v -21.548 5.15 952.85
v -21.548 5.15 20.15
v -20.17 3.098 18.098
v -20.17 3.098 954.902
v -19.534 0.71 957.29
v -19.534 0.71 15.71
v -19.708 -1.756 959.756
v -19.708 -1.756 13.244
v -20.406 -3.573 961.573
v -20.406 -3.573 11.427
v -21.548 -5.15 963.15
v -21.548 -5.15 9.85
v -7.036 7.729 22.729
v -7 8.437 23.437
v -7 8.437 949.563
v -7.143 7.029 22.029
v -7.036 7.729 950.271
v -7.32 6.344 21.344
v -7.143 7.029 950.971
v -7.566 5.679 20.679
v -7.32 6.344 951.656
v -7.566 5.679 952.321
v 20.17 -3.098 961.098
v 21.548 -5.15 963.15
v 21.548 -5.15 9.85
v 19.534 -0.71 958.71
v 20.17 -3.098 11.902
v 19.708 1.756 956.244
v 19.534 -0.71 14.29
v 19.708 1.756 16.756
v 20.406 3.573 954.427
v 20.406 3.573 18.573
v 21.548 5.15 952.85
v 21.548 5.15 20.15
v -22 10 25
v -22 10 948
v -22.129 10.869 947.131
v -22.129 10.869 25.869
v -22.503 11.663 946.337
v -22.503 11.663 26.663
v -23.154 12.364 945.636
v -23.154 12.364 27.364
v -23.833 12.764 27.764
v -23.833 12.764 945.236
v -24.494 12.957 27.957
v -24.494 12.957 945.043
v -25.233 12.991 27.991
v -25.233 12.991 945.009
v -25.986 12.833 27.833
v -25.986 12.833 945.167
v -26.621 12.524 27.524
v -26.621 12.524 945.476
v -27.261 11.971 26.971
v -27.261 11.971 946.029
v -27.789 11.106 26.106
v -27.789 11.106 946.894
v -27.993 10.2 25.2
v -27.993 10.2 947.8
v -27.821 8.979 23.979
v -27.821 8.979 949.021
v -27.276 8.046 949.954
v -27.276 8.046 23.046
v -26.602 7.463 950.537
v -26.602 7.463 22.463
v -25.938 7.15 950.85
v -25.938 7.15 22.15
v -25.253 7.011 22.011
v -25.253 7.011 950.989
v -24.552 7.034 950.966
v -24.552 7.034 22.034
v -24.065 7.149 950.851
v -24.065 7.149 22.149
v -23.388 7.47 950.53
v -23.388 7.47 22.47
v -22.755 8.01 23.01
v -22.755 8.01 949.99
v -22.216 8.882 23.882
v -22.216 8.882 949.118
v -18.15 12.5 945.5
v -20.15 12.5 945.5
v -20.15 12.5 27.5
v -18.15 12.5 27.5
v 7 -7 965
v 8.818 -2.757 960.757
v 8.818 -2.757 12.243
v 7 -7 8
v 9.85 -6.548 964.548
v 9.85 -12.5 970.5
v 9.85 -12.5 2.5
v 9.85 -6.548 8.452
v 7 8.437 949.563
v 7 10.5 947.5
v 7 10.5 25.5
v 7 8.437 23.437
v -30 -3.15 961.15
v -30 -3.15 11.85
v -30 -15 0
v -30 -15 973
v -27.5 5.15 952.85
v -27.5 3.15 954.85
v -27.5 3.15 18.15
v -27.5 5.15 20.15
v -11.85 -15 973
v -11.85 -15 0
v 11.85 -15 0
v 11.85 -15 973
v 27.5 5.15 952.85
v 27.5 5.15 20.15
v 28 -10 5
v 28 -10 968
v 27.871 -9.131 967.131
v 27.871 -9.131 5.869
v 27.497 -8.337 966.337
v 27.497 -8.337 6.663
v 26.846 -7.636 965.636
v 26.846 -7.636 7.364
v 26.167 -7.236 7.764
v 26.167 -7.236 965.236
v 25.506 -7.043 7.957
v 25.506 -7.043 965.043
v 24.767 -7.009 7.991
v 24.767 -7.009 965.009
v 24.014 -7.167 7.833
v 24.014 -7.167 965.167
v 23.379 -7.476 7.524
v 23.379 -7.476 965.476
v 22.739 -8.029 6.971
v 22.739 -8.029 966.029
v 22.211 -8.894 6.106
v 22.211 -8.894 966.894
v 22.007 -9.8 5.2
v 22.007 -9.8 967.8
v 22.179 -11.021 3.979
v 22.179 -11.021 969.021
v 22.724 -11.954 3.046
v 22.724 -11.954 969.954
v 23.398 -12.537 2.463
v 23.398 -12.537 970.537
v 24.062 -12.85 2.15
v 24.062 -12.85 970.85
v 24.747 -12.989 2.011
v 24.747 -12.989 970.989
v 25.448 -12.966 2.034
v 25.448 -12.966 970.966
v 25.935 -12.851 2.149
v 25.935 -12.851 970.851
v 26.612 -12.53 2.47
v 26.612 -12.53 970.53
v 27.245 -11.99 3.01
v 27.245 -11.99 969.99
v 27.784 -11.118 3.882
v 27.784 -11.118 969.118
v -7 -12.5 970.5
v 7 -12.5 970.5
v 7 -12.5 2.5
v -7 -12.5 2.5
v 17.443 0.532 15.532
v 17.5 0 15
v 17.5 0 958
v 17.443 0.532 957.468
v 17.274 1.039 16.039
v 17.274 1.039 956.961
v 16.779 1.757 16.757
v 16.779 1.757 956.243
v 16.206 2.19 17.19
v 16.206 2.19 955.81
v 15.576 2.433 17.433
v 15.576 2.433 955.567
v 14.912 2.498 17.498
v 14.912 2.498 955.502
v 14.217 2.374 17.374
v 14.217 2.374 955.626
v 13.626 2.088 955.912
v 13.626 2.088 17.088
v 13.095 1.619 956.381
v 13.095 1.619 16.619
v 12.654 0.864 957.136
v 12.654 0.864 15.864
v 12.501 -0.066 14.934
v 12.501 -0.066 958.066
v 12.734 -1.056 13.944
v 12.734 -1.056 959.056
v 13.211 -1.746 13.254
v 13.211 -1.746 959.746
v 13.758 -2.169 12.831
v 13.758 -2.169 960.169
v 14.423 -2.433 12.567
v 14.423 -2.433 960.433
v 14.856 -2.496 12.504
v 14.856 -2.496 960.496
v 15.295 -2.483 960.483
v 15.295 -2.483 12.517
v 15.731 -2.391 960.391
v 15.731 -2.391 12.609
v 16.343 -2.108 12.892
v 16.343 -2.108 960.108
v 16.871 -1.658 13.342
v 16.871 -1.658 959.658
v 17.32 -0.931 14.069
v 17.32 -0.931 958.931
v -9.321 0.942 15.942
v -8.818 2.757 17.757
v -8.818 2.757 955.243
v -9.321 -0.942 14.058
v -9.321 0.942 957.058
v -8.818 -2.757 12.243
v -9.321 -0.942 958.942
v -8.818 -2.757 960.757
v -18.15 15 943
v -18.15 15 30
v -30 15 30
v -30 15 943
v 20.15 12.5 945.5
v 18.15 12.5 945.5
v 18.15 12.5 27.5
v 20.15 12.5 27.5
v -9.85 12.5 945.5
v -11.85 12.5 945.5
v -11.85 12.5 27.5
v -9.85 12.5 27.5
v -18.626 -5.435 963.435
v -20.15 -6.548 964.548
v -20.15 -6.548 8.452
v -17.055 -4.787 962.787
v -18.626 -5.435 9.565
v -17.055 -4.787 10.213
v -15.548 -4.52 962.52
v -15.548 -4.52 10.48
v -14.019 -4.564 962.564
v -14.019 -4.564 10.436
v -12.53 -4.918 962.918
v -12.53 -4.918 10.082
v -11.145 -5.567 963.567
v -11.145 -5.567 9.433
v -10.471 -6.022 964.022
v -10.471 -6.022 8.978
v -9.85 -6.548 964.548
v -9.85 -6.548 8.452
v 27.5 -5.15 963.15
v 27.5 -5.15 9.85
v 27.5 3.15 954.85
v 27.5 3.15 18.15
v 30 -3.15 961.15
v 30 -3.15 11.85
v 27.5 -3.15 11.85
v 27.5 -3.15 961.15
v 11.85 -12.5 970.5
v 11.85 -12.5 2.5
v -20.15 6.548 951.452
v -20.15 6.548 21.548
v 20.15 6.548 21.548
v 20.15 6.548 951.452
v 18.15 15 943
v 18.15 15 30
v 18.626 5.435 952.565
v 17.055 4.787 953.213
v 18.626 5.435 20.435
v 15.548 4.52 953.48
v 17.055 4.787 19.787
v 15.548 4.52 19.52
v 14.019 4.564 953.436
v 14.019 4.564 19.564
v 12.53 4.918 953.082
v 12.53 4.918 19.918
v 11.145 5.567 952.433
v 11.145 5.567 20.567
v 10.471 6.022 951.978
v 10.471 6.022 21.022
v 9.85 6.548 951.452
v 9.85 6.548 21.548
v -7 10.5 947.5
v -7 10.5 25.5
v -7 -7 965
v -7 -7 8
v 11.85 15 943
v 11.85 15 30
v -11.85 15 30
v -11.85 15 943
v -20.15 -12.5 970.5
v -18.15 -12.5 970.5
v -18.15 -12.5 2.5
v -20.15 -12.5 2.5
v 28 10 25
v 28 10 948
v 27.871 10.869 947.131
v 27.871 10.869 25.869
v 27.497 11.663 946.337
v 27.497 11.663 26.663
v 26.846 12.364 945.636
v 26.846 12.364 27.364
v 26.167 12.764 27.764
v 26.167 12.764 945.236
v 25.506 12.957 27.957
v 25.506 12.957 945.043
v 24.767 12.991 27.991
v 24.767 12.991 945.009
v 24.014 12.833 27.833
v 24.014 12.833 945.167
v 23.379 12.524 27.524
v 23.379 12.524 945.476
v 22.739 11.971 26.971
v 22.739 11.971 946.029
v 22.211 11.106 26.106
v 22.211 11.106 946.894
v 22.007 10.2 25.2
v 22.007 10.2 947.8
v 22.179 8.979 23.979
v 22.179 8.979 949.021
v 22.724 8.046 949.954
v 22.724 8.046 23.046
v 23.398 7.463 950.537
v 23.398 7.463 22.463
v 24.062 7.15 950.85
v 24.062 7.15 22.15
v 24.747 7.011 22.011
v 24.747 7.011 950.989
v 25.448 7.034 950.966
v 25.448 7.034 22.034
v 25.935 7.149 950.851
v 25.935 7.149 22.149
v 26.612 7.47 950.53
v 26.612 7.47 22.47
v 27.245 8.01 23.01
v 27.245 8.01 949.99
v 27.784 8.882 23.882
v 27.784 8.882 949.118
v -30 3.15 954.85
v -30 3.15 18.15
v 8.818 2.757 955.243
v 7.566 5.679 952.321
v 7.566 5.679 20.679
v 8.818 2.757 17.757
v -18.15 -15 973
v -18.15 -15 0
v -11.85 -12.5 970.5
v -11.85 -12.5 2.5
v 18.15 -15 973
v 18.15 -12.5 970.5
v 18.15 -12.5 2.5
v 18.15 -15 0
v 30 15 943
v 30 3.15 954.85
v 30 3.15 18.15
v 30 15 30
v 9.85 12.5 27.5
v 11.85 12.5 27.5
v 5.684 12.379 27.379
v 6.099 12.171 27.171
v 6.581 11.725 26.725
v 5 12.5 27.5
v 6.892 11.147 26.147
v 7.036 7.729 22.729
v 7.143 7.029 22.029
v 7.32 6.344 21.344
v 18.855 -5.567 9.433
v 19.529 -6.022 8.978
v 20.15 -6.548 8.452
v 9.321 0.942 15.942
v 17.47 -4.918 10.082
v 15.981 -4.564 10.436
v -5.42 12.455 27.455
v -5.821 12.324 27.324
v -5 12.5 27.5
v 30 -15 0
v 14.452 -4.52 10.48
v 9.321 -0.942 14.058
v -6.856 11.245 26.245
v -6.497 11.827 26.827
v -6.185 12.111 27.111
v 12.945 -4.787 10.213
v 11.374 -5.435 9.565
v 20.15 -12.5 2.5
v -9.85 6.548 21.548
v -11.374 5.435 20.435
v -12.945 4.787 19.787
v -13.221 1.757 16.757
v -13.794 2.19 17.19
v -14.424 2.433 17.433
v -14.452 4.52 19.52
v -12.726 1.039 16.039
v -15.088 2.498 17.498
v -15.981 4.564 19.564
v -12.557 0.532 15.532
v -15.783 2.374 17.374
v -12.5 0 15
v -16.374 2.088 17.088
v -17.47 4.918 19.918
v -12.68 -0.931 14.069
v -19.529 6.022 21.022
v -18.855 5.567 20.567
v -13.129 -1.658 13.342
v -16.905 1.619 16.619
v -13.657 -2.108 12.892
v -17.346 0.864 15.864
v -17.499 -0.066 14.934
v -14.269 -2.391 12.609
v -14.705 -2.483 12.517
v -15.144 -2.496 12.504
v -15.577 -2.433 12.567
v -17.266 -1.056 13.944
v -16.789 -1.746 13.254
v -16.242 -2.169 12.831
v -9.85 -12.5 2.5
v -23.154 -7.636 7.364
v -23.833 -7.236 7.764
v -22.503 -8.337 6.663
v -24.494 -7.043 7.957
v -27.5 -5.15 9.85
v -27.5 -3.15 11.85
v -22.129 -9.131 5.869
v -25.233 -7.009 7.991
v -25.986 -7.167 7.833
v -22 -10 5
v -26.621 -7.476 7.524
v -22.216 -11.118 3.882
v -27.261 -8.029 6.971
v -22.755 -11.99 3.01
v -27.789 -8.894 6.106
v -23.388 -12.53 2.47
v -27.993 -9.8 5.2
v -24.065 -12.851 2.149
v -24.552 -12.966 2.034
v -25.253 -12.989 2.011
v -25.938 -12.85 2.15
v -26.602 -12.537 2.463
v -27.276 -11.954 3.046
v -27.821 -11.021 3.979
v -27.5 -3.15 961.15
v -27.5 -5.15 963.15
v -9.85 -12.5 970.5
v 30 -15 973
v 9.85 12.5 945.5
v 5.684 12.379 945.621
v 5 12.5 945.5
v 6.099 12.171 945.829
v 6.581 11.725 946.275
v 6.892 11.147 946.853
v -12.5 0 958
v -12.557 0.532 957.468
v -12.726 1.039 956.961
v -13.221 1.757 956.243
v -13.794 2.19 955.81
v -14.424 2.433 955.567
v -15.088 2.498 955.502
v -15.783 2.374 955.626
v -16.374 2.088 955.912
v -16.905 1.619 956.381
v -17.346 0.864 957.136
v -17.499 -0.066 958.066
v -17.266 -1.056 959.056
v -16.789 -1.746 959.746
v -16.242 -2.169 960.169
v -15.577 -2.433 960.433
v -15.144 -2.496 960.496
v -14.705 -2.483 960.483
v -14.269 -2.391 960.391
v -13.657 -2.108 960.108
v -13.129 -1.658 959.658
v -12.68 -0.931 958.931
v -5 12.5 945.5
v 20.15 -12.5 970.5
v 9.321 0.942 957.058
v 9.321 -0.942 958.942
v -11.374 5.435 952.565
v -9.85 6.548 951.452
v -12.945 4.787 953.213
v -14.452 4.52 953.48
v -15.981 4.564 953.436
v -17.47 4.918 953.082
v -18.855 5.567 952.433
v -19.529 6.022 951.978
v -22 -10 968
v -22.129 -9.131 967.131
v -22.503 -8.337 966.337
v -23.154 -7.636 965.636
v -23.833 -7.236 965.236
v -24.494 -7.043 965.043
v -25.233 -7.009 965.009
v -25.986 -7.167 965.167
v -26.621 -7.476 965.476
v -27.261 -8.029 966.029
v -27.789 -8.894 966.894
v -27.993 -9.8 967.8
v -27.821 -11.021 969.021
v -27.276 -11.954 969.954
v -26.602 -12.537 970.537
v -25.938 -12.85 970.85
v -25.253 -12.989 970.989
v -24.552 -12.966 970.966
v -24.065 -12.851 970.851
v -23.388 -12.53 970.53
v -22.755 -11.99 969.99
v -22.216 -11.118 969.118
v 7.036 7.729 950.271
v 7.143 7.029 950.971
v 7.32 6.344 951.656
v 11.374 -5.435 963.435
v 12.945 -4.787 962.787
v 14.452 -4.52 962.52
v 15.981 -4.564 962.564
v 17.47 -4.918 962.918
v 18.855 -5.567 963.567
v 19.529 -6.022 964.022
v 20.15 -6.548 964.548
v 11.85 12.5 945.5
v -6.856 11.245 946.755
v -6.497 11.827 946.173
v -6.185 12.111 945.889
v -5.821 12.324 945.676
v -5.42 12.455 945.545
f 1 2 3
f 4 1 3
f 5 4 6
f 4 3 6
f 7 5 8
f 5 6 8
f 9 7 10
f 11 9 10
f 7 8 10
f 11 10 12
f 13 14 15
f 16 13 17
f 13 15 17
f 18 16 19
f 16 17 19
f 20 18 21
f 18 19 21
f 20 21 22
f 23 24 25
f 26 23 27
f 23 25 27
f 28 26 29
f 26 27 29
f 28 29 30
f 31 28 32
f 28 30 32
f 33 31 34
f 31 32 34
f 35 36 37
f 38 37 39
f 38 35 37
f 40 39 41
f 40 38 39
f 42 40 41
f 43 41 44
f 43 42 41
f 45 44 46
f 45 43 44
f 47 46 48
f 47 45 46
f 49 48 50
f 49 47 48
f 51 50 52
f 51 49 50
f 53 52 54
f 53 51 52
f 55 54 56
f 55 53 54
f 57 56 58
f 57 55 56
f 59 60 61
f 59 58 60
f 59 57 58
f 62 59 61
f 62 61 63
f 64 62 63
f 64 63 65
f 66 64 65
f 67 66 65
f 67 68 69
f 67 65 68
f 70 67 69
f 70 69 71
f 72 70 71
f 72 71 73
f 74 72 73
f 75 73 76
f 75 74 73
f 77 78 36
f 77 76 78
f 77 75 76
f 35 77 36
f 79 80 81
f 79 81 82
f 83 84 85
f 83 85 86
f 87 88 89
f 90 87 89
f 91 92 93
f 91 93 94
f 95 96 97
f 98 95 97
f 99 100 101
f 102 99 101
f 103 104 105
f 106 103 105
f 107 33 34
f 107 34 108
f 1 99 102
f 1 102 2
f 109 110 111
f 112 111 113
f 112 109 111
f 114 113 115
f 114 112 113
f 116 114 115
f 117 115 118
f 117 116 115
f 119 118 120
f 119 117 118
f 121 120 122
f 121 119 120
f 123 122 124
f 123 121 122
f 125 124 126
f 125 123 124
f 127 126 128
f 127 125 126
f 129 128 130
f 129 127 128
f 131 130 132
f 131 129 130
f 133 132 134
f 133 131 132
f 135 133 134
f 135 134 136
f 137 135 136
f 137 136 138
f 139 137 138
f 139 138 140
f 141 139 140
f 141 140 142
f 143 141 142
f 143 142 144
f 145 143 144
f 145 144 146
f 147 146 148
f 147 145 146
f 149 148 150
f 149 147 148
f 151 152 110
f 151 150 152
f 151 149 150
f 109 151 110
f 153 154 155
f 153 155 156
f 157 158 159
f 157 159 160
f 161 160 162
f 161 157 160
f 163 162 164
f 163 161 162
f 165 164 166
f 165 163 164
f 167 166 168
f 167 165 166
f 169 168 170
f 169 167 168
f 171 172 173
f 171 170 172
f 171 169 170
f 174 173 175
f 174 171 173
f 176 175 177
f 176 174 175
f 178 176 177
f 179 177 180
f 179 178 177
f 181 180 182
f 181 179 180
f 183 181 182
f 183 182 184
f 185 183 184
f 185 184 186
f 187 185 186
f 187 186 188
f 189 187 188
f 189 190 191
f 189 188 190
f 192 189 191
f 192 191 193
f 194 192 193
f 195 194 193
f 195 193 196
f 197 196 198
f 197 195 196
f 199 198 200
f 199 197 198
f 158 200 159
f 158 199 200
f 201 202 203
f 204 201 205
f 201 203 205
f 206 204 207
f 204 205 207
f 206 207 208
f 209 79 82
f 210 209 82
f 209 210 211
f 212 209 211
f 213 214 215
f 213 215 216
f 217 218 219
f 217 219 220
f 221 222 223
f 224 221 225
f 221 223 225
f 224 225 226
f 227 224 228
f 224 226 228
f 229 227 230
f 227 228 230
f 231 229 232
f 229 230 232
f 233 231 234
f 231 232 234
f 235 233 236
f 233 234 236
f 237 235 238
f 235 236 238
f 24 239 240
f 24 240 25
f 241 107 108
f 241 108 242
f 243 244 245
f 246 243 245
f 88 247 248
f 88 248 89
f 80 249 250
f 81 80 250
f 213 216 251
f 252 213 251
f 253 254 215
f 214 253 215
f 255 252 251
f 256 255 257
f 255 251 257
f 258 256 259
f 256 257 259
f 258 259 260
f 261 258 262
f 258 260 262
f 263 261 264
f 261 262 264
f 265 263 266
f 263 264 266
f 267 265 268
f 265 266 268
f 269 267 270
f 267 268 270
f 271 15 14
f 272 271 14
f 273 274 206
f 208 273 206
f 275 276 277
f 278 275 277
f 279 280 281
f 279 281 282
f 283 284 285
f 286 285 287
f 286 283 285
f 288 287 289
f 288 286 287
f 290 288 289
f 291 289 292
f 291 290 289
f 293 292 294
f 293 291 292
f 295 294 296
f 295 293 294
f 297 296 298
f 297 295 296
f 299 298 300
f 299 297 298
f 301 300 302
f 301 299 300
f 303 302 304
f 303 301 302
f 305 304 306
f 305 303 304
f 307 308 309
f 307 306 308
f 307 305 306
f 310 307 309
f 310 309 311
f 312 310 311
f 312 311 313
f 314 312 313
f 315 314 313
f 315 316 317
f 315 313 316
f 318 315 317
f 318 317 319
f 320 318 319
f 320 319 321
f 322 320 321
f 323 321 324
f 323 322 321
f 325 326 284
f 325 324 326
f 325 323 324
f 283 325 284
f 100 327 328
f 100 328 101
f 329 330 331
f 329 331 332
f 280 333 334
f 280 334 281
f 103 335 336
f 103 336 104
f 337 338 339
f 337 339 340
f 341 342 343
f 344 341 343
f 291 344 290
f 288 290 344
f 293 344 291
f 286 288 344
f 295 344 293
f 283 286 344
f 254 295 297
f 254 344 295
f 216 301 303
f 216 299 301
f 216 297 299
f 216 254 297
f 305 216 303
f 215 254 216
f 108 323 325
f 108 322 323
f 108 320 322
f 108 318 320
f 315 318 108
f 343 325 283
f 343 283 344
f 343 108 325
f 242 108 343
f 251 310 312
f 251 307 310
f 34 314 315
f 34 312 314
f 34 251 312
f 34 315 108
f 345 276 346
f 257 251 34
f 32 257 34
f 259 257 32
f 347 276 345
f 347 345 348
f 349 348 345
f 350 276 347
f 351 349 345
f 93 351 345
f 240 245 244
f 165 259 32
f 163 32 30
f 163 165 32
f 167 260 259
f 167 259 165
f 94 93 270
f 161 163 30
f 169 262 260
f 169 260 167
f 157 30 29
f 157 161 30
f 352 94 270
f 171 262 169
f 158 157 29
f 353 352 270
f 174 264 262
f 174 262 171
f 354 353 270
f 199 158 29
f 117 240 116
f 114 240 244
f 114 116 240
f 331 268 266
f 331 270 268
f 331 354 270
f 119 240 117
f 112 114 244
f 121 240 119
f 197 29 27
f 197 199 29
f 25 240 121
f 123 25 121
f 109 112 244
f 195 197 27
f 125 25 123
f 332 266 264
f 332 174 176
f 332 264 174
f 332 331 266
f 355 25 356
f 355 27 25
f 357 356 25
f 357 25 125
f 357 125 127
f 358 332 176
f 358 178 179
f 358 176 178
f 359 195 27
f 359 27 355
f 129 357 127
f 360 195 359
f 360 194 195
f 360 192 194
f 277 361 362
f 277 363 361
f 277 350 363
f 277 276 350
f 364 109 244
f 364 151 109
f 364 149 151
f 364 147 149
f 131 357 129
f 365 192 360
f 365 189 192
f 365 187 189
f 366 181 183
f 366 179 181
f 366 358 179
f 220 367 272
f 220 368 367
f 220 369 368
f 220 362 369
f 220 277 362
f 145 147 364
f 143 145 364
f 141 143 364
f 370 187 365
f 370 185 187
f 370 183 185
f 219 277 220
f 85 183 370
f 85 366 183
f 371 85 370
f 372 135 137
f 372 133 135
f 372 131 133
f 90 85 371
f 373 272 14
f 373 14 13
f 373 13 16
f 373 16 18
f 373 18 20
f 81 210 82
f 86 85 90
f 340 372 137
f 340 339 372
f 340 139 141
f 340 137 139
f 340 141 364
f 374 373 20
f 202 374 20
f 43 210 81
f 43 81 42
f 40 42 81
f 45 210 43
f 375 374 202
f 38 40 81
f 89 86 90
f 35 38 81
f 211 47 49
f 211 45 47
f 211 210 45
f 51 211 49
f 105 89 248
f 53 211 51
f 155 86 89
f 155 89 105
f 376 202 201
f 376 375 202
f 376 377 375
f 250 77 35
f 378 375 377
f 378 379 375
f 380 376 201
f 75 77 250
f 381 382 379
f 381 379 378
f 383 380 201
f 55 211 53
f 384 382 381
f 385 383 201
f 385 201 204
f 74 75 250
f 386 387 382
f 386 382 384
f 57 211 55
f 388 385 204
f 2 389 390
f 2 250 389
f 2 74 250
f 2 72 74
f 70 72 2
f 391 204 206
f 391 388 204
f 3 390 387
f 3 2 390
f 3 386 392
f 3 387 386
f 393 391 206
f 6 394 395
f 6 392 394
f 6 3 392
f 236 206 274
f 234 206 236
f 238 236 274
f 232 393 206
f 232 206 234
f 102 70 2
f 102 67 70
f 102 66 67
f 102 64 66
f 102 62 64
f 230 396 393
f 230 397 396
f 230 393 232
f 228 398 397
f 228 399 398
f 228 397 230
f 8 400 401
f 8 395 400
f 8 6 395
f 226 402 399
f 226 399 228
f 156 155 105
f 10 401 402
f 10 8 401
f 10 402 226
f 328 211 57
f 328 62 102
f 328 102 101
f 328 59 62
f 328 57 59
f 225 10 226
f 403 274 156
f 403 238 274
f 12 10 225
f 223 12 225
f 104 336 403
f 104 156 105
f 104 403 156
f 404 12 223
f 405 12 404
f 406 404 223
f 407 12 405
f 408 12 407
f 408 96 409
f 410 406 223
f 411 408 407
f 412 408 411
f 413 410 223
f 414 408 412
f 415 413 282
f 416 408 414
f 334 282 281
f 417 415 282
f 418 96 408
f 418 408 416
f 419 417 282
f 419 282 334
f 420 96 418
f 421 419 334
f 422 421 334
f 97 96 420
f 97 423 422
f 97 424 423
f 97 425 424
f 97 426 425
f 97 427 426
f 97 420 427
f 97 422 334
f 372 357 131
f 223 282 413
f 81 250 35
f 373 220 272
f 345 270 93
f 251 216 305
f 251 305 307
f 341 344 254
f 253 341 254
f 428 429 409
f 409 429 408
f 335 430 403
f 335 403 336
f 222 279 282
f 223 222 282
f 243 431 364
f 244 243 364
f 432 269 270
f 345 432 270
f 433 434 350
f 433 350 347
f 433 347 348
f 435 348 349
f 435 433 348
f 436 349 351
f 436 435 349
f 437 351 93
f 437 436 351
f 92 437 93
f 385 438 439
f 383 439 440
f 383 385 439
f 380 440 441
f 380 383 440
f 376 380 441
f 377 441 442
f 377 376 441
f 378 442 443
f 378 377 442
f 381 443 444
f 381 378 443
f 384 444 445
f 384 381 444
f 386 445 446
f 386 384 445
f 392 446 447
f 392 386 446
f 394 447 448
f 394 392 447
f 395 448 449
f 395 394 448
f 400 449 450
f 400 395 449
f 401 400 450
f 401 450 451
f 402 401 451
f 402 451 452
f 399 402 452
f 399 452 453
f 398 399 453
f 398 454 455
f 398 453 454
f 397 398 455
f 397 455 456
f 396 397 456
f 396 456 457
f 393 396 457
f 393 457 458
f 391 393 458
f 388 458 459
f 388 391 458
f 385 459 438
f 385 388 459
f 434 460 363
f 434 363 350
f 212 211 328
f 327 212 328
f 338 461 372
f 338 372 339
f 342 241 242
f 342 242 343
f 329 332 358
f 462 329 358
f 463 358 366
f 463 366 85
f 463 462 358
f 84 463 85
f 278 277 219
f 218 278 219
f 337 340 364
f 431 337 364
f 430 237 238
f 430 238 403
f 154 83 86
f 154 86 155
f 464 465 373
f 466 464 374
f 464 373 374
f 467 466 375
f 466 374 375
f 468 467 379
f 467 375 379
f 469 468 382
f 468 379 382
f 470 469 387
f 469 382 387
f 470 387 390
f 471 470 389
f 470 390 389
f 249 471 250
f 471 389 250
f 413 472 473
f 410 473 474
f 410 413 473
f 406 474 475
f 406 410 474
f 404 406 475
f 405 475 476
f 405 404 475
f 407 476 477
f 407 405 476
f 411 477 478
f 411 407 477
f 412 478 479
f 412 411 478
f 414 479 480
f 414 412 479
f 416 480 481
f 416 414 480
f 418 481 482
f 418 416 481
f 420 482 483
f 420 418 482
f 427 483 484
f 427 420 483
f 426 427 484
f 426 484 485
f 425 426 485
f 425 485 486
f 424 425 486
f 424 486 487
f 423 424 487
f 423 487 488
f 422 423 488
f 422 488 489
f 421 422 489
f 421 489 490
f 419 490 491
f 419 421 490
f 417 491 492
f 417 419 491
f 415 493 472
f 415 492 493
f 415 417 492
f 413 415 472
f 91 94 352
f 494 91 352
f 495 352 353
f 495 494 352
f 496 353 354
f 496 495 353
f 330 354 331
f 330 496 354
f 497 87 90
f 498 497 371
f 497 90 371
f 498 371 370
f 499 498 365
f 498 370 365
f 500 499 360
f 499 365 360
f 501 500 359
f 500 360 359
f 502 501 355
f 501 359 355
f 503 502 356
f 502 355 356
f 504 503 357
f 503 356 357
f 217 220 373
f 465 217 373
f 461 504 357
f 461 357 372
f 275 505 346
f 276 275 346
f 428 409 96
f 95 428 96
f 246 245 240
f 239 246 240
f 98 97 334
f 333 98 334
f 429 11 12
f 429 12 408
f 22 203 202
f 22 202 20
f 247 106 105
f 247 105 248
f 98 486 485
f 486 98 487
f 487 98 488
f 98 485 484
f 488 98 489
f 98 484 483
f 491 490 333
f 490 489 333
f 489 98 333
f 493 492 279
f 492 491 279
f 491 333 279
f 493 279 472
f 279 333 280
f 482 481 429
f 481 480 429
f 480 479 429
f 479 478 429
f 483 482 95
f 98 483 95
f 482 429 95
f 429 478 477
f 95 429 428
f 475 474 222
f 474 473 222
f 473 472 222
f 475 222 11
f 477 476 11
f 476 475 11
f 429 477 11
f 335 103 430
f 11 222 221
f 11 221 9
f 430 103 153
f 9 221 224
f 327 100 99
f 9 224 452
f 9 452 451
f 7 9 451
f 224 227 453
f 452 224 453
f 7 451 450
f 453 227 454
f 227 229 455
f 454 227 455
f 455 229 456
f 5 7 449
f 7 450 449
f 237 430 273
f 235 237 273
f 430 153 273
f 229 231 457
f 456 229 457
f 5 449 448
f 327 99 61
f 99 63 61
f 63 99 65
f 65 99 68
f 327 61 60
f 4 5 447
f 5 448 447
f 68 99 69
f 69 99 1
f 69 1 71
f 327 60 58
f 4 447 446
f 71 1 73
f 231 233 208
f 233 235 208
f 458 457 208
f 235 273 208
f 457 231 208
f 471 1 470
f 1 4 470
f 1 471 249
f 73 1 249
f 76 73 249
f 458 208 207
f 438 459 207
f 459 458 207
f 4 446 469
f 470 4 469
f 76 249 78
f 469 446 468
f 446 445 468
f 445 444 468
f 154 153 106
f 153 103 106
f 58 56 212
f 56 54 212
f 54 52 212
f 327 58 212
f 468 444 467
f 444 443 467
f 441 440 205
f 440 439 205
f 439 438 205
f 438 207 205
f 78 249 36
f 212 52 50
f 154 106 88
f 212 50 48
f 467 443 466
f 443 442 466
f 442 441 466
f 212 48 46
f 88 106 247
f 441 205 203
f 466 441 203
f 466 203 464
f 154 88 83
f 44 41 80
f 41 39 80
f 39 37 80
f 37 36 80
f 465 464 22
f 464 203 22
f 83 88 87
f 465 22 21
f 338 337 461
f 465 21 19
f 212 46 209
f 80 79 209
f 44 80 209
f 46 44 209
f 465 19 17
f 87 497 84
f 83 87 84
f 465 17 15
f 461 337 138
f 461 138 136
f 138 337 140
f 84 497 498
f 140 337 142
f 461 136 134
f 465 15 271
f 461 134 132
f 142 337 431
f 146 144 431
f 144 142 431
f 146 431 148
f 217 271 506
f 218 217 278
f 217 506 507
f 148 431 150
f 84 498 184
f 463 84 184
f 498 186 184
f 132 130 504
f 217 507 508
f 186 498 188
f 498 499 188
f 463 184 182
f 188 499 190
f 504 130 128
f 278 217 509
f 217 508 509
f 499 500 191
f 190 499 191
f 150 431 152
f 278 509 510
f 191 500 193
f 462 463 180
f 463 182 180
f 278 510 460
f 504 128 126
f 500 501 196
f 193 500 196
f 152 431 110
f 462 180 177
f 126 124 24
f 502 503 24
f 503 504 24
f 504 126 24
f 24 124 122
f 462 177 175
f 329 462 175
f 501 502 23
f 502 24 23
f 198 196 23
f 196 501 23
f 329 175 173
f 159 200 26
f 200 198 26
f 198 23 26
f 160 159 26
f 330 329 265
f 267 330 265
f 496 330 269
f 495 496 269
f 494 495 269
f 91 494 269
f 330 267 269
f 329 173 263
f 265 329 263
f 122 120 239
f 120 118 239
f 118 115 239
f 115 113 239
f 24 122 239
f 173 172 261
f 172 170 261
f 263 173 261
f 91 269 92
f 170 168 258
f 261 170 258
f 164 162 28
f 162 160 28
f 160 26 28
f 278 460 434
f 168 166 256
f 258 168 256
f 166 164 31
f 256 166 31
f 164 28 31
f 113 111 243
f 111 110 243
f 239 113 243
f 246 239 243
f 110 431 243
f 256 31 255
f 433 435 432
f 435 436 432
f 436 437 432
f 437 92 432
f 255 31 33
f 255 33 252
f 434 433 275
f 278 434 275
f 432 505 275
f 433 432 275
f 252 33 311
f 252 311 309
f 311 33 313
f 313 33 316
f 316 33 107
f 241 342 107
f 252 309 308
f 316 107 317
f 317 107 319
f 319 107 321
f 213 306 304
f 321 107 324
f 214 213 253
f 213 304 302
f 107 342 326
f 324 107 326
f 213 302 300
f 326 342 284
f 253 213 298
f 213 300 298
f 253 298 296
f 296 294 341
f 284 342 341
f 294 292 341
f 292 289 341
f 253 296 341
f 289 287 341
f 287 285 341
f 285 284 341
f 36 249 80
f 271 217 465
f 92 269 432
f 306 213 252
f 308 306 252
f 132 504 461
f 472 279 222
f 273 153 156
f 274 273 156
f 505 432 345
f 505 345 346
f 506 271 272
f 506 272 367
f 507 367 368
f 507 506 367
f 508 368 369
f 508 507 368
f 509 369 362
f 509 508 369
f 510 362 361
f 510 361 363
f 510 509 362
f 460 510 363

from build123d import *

# Parameters (mm, degrees)
F0_R     = 3
F0_R_2   = 2.5
F1_DEPTH = 973
F2_R     = 2
F3_R     = 7
F5_DEPTH = 30


# Not quite as in the source:
# - a feature names something its author has since deleted; it is built from what else it names


with BuildPart() as f1:
    # F0 (on Top) → F1 (new body)
    with BuildSketch(Plane.XY):
        with BuildLine():
            Line((18.15, -15), (30, -15))
            Line((30, -15), (30, -3.15))
            Line((30, -3.15), (27.5, -3.15))
            Line((27.5, -3.15), (27.5, -5.15))
            Line((27.5, -5.15), (21.5477069044, -5.15))
            ThreePointArc((21.5477069044, -5.15), (19.5, 0), (21.5477069044, 5.15))
            Line((21.5477069044, 5.15), (27.5, 5.15))
            Line((27.5, 5.15), (27.5, 3.15))
            Line((27.5, 3.15), (30, 3.15))
            Line((30, 3.15), (30, 15))
            Line((30, 15), (18.15, 15))
            Line((18.15, 15), (18.15, 12.5))
            Line((18.15, 12.5), (20.15, 12.5))
            Line((20.15, 12.5), (20.15, 6.5477069044))
            ThreePointArc((20.15, 6.5477069044), (15, 4.5), (9.85, 6.5477069044))
            Line((9.85, 6.5477069044), (9.85, 12.5))
            Line((9.85, 12.5), (11.85, 12.5))
            Line((11.85, 12.5), (11.85, 15))
            Line((11.85, 15), (-11.85, 15))
            Line((-11.85, 15), (-11.85, 12.5))
            Line((-11.85, 12.5), (-9.85, 12.5))
            Line((-9.85, 12.5), (-9.85, 6.5477069044))
            ThreePointArc((-9.85, 6.5477069044), (-15, 4.5), (-20.15, 6.5477069044))
            Line((-20.15, 6.5477069044), (-20.15, 12.5))
            Line((-20.15, 12.5), (-18.15, 12.5))
            Line((-18.15, 12.5), (-18.15, 15))
            Line((-18.15, 15), (-30, 15))
            Line((-30, 15), (-30, 3.15))
            Line((-30, 3.15), (-27.5, 3.15))
            Line((-27.5, 3.15), (-27.5, 5.15))
            Line((-27.5, 5.15), (-21.5477069044, 5.15))
            ThreePointArc((-21.5477069044, 5.15), (-19.5, 0), (-21.5477069044, -5.15))
            Line((-21.5477069044, -5.15), (-27.5, -5.15))
            Line((-27.5, -5.15), (-27.5, -3.15))
            Line((-27.5, -3.15), (-30, -3.15))
            Line((-30, -3.15), (-30, -15))
            Line((-30, -15), (-18.15, -15))
            Line((-18.15, -15), (-18.15, -12.5))
            Line((-18.15, -12.5), (-20.15, -12.5))
            Line((-20.15, -12.5), (-20.15, -6.5477069044))
            ThreePointArc((-20.15, -6.5477069044), (-15, -4.5), (-9.85, -6.5477069044))
            Line((-9.85, -6.5477069044), (-9.85, -12.5))
            Line((-9.85, -12.5), (-11.85, -12.5))
            Line((-11.85, -12.5), (-11.85, -15))
            Line((-11.85, -15), (11.85, -15))
            Line((11.85, -15), (11.85, -12.5))
            Line((11.85, -12.5), (9.85, -12.5))
            Line((9.85, -12.5), (9.85, -6.5477069044))
            ThreePointArc((9.85, -6.5477069044), (15, -4.5), (20.15, -6.5477069044))
            Line((20.15, -6.5477069044), (20.15, -12.5))
            Line((20.15, -12.5), (18.15, -12.5))
            Line((18.15, -12.5), (18.15, -15))
        make_face()
        with Locations((-25, -10)):
            Circle(F0_R, mode=Mode.SUBTRACT)
        with Locations((25, -10)):
            Circle(F0_R, mode=Mode.SUBTRACT)
        with Locations((-15, 0)):
            Circle(F0_R_2, mode=Mode.SUBTRACT)
        with Locations((-25, 10)):
            Circle(F0_R, mode=Mode.SUBTRACT)
        Polygon((-7, 7), (-7, 12.5), (0, 12.5), (7, 12.5), (7, 7), (10, 0), (7, -7), (7, -12.5), (0, -12.5), (-7, -12.5), (-7, -7), (-10, 0), align=None, mode=Mode.SUBTRACT)
        with Locations((15, 0)):
            Circle(F0_R_2, mode=Mode.SUBTRACT)
        with Locations((25, 10)):
            Circle(F0_R, mode=Mode.SUBTRACT)
    extrude(amount=F1_DEPTH)

    # F2
    f2_edges = [f1.edges().sort_by_distance(p)[0] for p in [
        (-7, 12.5, 486.5),
        (7, 12.5, 486.5),
    ]]
    fillet(f2_edges, radius=F2_R)

    # F3
    f3_edges = [f1.edges().sort_by_distance(p)[0] for p in [
        (-7, 7, 486.5),
        (-10, 0, 486.5),
        (7, 7, 486.5),
        (10, 0, 486.5),
    ]]
    fillet(f3_edges, radius=F3_R)

    # F4 (on Right) → F5 (cut, symmetric)
    with BuildSketch(Plane.YZ):
        Polygon((15, 30), (-15, 0), (15, 0), align=None)
        Polygon((15, 973), (-15, 973), (15, 943), align=None)
    extrude(amount=F5_DEPTH, both=True, mode=Mode.SUBTRACT)


solid = f1.part
